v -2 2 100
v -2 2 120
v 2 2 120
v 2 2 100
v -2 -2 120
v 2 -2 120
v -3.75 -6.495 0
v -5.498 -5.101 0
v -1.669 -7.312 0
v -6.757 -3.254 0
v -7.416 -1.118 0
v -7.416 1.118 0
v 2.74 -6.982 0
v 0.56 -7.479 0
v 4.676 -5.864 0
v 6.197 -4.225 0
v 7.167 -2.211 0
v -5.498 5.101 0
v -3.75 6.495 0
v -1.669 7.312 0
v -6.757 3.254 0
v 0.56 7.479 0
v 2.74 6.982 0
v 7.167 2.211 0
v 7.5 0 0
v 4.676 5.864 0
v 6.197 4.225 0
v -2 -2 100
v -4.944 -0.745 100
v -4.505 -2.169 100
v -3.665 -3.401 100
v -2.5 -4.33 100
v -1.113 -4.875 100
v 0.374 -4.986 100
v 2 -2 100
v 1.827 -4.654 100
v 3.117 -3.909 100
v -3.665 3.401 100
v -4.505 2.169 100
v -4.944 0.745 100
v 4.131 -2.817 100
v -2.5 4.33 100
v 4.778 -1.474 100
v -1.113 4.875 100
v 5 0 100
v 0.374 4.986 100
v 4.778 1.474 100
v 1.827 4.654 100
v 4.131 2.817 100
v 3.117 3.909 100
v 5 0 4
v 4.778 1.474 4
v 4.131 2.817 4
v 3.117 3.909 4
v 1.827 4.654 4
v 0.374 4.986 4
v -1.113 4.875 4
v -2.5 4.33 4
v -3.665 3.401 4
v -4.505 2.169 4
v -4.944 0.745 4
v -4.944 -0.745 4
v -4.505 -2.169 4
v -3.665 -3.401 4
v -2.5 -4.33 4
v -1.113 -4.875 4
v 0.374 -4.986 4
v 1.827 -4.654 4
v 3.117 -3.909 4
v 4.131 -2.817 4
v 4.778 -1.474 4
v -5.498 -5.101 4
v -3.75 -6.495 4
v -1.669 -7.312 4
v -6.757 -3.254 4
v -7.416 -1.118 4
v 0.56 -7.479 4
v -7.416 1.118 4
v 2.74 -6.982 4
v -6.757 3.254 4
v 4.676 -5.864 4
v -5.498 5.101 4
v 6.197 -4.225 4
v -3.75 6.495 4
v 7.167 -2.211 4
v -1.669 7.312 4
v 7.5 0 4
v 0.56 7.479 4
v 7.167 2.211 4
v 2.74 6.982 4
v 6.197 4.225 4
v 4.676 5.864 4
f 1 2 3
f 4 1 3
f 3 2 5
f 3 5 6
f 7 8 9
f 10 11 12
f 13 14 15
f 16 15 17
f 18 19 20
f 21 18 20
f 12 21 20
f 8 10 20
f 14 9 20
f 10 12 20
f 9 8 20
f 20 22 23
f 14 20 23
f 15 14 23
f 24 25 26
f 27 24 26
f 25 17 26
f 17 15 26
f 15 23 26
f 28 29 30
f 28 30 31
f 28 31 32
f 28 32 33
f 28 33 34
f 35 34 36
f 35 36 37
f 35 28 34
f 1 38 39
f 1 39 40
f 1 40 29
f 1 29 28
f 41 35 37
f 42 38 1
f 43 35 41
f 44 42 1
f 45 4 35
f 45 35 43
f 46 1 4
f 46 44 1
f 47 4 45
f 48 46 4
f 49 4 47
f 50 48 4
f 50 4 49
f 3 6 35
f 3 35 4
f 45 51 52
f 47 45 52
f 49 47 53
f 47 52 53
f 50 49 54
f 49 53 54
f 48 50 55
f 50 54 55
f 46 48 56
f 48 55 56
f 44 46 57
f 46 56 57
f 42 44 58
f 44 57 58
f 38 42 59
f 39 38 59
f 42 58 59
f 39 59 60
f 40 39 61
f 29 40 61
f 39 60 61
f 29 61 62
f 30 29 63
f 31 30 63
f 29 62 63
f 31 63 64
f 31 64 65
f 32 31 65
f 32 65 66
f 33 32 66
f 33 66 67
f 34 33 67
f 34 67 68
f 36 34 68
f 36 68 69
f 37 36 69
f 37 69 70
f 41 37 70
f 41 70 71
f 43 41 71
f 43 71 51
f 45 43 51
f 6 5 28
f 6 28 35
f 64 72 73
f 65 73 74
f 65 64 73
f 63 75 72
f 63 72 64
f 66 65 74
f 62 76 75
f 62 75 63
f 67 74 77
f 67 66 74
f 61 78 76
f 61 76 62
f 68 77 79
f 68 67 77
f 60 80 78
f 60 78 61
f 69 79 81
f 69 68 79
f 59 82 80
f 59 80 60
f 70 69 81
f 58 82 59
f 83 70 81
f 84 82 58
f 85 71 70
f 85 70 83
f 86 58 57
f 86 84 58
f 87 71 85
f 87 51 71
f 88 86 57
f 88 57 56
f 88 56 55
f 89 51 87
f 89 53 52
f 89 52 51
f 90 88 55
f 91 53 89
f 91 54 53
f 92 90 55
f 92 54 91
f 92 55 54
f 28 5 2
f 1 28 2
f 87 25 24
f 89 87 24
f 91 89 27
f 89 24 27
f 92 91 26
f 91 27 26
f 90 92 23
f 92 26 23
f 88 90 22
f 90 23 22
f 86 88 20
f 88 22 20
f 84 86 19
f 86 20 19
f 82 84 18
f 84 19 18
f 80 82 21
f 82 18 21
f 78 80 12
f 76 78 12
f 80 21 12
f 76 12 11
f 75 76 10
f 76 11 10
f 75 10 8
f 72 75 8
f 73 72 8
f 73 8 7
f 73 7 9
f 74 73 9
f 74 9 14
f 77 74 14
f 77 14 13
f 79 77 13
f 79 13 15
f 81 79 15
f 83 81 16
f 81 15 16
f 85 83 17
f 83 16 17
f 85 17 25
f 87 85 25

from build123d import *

# Parameters (mm, degrees)
F0_R     = 7.5
F1_DEPTH = 4
F2_R     = 5
F3_DEPTH = 100
F4_W     = 4
F4_H     = 4
F5_DEPTH = 20


with BuildPart() as f1:
    # F0 (on Top) → F1 (new body)
    with BuildSketch(Plane.XY):
        Circle(F0_R)
    extrude(amount=F1_DEPTH)

    # F2 (on Top) → F3 (join)
    with BuildSketch(Plane.XY):
        Circle(F2_R)
    extrude(amount=F3_DEPTH)

    # F4 (on face) → F5 (join)
    with BuildSketch(Plane.XY.offset(100)):
        Rectangle(F4_W, F4_H)
    extrude(amount=F5_DEPTH)


solid = f1.part
